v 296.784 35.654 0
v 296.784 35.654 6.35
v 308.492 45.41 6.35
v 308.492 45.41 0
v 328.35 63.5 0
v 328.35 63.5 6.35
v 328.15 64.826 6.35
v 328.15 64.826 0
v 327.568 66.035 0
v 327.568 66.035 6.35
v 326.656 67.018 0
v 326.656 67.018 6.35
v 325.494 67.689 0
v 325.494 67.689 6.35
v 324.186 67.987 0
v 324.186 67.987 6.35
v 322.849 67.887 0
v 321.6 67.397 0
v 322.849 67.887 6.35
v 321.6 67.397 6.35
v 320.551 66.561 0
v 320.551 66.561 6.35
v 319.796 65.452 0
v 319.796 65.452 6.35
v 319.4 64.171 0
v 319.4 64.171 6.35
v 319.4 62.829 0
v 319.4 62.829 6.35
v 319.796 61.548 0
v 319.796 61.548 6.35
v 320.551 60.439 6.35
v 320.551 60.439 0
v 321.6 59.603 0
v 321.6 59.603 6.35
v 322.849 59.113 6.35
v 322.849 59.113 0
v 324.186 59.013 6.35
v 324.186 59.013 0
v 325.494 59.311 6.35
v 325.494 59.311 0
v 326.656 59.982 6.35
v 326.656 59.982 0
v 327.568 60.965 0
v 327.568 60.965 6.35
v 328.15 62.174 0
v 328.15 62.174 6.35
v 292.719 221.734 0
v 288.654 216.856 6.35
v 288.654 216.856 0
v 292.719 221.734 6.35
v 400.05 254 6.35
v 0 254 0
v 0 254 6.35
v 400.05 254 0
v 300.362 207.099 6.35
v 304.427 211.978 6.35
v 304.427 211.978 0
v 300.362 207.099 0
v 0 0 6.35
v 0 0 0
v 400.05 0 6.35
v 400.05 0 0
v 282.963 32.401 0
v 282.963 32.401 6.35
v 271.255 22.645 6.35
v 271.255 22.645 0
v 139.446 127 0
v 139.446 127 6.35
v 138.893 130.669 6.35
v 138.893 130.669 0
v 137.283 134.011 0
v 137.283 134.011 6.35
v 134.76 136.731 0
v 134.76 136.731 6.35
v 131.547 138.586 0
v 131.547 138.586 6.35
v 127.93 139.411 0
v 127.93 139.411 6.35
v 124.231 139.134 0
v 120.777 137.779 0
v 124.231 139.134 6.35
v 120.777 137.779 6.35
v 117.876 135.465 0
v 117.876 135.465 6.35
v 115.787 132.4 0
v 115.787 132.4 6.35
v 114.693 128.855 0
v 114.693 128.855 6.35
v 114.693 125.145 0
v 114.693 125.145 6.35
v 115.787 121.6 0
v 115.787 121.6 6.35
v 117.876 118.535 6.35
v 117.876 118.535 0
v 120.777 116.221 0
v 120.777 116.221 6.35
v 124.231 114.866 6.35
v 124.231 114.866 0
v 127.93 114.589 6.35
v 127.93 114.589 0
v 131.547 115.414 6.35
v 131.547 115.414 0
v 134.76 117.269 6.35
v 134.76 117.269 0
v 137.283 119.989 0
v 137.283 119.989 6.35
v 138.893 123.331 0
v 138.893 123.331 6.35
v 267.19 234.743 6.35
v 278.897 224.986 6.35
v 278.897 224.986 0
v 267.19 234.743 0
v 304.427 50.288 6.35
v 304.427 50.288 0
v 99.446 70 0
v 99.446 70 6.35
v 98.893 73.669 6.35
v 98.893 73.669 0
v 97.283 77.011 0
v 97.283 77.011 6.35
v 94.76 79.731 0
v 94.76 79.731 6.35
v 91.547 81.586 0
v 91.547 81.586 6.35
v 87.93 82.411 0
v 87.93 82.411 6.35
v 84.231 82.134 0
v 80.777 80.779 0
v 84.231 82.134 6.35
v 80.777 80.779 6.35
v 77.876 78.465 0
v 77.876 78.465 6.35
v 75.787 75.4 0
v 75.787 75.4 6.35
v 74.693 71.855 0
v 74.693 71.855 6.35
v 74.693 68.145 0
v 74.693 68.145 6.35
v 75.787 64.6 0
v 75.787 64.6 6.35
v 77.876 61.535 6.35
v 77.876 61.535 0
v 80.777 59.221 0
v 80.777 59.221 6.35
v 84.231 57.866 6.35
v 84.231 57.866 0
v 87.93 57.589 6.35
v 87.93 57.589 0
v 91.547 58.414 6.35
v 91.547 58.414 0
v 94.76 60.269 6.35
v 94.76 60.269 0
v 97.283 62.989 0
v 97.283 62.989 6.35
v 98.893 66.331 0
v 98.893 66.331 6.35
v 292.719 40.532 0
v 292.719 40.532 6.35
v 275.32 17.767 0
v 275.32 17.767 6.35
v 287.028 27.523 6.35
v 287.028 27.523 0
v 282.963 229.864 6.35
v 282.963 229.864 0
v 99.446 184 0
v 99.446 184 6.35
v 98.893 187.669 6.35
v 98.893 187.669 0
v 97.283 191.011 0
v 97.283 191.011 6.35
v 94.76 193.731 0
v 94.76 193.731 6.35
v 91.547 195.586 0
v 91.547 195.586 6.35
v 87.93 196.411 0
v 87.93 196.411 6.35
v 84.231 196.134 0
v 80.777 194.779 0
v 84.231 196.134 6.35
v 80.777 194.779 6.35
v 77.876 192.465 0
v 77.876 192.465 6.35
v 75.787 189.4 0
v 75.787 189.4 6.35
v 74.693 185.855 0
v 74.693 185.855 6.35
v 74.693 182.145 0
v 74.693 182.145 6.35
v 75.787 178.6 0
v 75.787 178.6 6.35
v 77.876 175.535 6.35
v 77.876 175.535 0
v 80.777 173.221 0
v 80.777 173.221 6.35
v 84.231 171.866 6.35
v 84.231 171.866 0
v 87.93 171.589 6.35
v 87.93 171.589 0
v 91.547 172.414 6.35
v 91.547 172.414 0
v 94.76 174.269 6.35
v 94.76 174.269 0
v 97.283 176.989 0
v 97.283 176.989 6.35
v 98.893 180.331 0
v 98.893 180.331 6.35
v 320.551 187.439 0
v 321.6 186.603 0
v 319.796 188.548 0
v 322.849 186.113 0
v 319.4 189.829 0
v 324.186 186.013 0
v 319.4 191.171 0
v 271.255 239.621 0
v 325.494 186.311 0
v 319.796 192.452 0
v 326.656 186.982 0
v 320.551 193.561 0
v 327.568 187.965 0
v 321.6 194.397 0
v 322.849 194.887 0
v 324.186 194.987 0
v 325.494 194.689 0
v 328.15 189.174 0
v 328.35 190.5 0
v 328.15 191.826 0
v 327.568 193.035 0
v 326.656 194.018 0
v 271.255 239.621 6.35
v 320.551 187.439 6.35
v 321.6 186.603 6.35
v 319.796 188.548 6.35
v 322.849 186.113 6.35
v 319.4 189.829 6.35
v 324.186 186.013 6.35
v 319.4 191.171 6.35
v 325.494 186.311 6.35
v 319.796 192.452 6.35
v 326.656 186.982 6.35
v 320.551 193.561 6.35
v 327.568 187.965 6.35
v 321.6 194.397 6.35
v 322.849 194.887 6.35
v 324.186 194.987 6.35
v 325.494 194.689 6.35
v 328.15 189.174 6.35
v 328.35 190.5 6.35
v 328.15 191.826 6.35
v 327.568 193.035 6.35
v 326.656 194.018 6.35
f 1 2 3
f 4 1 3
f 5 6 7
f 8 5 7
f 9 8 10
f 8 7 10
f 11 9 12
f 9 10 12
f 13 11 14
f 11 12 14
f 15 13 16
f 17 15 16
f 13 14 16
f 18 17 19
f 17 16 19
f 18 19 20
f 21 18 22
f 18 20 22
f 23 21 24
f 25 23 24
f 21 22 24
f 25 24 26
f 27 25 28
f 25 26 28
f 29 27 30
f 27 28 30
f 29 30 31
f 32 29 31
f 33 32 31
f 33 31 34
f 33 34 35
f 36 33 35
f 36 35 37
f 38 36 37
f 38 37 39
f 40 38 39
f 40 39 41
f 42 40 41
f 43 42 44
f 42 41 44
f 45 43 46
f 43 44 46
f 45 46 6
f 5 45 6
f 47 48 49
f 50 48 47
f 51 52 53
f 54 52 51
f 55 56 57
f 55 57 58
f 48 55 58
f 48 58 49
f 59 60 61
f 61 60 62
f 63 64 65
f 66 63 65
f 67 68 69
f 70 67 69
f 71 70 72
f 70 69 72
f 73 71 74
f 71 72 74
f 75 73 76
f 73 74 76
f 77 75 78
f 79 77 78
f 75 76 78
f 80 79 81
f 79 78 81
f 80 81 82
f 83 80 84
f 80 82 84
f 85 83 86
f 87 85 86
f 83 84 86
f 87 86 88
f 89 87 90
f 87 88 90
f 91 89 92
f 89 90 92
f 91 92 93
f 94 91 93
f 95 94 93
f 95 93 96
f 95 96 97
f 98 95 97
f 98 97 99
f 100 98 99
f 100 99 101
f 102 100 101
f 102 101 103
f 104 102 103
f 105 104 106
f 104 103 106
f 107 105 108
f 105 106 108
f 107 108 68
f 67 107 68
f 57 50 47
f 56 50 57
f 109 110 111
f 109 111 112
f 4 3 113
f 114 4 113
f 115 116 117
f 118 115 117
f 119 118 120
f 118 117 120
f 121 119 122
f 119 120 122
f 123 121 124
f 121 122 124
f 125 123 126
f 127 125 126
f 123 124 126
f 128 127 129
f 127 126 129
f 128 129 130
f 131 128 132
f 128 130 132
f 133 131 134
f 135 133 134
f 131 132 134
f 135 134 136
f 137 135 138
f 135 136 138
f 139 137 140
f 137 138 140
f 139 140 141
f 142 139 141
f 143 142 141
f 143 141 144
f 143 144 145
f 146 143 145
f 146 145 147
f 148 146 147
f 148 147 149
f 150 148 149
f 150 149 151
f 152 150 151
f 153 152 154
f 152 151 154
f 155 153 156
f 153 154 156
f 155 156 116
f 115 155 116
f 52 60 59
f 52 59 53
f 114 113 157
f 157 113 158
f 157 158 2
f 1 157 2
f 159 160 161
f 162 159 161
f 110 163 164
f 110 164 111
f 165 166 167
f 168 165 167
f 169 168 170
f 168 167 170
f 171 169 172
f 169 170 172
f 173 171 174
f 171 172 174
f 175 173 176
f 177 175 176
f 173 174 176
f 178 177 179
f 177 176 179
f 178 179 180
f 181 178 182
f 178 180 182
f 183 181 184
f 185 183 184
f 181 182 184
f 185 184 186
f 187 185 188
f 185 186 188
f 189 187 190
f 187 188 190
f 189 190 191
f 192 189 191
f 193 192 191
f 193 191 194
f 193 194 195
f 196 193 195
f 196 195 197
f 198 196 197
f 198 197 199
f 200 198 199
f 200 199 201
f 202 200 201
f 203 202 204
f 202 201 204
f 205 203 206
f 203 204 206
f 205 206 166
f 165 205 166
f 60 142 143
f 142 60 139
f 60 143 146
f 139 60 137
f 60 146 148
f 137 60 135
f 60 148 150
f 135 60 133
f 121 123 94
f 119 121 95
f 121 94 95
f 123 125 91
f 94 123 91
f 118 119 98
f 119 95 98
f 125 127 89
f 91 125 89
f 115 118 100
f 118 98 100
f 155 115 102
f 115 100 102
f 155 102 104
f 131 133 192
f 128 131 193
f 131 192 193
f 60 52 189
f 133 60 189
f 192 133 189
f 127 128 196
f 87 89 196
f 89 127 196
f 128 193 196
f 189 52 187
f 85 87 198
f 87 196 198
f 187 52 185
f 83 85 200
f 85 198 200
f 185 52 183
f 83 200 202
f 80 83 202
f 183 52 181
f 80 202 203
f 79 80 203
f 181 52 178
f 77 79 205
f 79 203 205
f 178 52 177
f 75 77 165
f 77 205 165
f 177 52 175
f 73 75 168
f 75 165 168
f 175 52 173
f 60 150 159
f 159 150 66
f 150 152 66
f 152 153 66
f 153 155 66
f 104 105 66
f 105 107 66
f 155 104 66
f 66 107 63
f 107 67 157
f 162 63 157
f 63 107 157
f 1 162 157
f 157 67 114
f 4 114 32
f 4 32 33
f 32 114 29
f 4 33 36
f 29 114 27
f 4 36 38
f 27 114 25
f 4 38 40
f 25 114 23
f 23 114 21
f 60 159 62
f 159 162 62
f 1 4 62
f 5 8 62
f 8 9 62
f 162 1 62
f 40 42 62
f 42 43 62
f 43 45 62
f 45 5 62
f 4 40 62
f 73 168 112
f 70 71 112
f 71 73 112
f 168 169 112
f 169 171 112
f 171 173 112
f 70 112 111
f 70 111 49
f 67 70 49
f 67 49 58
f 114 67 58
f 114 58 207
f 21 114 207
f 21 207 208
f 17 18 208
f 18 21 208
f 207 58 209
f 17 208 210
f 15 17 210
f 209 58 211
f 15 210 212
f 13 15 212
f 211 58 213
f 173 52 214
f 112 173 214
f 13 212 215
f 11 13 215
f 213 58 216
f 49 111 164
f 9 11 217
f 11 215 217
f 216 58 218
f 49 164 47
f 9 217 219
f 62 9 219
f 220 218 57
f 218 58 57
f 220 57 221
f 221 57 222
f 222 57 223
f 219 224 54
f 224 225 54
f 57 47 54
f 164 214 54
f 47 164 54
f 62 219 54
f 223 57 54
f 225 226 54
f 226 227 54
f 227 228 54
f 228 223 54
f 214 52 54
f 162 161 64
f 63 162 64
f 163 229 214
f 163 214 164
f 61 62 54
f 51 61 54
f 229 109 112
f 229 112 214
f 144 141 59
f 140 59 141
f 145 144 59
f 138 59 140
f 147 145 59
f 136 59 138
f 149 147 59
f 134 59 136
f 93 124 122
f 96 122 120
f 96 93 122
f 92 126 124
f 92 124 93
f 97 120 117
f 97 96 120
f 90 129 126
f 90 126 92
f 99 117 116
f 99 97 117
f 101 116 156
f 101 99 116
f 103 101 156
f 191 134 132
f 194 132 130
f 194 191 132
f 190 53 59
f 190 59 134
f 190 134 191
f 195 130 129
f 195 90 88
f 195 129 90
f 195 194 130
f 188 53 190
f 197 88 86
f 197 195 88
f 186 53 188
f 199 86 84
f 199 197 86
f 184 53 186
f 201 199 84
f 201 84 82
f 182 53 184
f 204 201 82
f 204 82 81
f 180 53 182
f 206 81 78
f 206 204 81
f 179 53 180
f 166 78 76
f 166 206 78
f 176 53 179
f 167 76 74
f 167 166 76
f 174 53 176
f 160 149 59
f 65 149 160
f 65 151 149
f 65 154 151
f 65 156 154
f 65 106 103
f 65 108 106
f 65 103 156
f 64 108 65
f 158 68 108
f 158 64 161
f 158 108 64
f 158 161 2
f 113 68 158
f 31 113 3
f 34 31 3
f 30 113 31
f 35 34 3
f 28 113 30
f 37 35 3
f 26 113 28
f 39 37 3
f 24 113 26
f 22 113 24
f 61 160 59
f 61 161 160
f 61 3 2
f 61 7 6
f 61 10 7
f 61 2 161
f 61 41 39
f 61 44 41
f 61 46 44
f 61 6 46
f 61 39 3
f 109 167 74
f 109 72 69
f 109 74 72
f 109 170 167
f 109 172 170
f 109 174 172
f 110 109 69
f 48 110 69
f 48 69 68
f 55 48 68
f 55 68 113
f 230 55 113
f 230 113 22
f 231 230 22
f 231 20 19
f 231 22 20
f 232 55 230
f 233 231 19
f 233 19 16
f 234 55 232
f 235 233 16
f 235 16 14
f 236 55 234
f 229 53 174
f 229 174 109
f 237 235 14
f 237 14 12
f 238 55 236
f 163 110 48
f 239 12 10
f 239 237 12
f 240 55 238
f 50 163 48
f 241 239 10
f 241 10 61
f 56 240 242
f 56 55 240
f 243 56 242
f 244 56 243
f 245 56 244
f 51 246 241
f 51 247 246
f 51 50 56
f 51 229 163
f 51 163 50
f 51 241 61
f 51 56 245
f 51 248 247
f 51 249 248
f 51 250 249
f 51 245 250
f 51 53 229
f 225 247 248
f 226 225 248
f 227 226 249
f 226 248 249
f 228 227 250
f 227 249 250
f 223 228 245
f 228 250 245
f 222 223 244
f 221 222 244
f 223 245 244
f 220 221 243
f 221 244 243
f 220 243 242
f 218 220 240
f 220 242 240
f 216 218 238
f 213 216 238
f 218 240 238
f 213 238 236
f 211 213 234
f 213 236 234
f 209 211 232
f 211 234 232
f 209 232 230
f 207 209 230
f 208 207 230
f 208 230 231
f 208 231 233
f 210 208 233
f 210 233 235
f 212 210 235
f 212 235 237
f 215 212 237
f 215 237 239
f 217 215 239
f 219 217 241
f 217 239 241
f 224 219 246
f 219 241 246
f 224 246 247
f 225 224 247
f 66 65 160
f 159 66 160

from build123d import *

# Parameters (mm, degrees)
SKETCH1_W           = 400.05
SKETCH1_H           = 254
BOSS_EXTRUDE1_DEPTH = 6.35
SKETCH2_R           = 4.5
SKETCH2_R_2         = 12.446
CUT_EXTRUDE1_DEPTH  = 6.35


with BuildPart() as part:
    # Sketch1 → Boss-Extrude1 (new body)
    with BuildSketch(Plane.XY):
        with Locations((200.025, 127)):
            Rectangle(SKETCH1_W, SKETCH1_H)
    extrude(amount=BOSS_EXTRUDE1_DEPTH)

    # Sketch2 → Cut-Extrude1 (cut)
    with BuildSketch(Plane.XY.offset(6.35)):
        with Locations((323.85, 63.5)):
            Circle(SKETCH2_R)
        with Locations((323.85, 190.5)):
            Circle(SKETCH2_R)
        with Locations((127, 127)):
            Circle(SKETCH2_R_2)
        with Locations((87, 70)):
            Circle(SKETCH2_R_2)
        with Locations((87, 184)):
            Circle(SKETCH2_R_2)
        Polygon((275.320145198, 17.766787665), (287.027837499, 27.523197916), (282.962666561, 32.401403041), (271.25497426, 22.64499279), align=None)
        Polygon((296.78424775, 35.653539792), (308.491940051, 45.409950042), (304.426769113, 50.288155168), (292.719076812, 40.531744917), align=None)
        Polygon((271.25497426, 239.620854783), (282.962666561, 229.864444532), (278.897495623, 224.986239407), (267.189803322, 234.742649658), align=None)
        Polygon((292.719076812, 221.734102657), (304.426769113, 211.977692406), (300.361598175, 207.09948728), (288.653905874, 216.855897531), align=None)
    extrude(amount=-CUT_EXTRUDE1_DEPTH, mode=Mode.SUBTRACT)


solid = part.part
